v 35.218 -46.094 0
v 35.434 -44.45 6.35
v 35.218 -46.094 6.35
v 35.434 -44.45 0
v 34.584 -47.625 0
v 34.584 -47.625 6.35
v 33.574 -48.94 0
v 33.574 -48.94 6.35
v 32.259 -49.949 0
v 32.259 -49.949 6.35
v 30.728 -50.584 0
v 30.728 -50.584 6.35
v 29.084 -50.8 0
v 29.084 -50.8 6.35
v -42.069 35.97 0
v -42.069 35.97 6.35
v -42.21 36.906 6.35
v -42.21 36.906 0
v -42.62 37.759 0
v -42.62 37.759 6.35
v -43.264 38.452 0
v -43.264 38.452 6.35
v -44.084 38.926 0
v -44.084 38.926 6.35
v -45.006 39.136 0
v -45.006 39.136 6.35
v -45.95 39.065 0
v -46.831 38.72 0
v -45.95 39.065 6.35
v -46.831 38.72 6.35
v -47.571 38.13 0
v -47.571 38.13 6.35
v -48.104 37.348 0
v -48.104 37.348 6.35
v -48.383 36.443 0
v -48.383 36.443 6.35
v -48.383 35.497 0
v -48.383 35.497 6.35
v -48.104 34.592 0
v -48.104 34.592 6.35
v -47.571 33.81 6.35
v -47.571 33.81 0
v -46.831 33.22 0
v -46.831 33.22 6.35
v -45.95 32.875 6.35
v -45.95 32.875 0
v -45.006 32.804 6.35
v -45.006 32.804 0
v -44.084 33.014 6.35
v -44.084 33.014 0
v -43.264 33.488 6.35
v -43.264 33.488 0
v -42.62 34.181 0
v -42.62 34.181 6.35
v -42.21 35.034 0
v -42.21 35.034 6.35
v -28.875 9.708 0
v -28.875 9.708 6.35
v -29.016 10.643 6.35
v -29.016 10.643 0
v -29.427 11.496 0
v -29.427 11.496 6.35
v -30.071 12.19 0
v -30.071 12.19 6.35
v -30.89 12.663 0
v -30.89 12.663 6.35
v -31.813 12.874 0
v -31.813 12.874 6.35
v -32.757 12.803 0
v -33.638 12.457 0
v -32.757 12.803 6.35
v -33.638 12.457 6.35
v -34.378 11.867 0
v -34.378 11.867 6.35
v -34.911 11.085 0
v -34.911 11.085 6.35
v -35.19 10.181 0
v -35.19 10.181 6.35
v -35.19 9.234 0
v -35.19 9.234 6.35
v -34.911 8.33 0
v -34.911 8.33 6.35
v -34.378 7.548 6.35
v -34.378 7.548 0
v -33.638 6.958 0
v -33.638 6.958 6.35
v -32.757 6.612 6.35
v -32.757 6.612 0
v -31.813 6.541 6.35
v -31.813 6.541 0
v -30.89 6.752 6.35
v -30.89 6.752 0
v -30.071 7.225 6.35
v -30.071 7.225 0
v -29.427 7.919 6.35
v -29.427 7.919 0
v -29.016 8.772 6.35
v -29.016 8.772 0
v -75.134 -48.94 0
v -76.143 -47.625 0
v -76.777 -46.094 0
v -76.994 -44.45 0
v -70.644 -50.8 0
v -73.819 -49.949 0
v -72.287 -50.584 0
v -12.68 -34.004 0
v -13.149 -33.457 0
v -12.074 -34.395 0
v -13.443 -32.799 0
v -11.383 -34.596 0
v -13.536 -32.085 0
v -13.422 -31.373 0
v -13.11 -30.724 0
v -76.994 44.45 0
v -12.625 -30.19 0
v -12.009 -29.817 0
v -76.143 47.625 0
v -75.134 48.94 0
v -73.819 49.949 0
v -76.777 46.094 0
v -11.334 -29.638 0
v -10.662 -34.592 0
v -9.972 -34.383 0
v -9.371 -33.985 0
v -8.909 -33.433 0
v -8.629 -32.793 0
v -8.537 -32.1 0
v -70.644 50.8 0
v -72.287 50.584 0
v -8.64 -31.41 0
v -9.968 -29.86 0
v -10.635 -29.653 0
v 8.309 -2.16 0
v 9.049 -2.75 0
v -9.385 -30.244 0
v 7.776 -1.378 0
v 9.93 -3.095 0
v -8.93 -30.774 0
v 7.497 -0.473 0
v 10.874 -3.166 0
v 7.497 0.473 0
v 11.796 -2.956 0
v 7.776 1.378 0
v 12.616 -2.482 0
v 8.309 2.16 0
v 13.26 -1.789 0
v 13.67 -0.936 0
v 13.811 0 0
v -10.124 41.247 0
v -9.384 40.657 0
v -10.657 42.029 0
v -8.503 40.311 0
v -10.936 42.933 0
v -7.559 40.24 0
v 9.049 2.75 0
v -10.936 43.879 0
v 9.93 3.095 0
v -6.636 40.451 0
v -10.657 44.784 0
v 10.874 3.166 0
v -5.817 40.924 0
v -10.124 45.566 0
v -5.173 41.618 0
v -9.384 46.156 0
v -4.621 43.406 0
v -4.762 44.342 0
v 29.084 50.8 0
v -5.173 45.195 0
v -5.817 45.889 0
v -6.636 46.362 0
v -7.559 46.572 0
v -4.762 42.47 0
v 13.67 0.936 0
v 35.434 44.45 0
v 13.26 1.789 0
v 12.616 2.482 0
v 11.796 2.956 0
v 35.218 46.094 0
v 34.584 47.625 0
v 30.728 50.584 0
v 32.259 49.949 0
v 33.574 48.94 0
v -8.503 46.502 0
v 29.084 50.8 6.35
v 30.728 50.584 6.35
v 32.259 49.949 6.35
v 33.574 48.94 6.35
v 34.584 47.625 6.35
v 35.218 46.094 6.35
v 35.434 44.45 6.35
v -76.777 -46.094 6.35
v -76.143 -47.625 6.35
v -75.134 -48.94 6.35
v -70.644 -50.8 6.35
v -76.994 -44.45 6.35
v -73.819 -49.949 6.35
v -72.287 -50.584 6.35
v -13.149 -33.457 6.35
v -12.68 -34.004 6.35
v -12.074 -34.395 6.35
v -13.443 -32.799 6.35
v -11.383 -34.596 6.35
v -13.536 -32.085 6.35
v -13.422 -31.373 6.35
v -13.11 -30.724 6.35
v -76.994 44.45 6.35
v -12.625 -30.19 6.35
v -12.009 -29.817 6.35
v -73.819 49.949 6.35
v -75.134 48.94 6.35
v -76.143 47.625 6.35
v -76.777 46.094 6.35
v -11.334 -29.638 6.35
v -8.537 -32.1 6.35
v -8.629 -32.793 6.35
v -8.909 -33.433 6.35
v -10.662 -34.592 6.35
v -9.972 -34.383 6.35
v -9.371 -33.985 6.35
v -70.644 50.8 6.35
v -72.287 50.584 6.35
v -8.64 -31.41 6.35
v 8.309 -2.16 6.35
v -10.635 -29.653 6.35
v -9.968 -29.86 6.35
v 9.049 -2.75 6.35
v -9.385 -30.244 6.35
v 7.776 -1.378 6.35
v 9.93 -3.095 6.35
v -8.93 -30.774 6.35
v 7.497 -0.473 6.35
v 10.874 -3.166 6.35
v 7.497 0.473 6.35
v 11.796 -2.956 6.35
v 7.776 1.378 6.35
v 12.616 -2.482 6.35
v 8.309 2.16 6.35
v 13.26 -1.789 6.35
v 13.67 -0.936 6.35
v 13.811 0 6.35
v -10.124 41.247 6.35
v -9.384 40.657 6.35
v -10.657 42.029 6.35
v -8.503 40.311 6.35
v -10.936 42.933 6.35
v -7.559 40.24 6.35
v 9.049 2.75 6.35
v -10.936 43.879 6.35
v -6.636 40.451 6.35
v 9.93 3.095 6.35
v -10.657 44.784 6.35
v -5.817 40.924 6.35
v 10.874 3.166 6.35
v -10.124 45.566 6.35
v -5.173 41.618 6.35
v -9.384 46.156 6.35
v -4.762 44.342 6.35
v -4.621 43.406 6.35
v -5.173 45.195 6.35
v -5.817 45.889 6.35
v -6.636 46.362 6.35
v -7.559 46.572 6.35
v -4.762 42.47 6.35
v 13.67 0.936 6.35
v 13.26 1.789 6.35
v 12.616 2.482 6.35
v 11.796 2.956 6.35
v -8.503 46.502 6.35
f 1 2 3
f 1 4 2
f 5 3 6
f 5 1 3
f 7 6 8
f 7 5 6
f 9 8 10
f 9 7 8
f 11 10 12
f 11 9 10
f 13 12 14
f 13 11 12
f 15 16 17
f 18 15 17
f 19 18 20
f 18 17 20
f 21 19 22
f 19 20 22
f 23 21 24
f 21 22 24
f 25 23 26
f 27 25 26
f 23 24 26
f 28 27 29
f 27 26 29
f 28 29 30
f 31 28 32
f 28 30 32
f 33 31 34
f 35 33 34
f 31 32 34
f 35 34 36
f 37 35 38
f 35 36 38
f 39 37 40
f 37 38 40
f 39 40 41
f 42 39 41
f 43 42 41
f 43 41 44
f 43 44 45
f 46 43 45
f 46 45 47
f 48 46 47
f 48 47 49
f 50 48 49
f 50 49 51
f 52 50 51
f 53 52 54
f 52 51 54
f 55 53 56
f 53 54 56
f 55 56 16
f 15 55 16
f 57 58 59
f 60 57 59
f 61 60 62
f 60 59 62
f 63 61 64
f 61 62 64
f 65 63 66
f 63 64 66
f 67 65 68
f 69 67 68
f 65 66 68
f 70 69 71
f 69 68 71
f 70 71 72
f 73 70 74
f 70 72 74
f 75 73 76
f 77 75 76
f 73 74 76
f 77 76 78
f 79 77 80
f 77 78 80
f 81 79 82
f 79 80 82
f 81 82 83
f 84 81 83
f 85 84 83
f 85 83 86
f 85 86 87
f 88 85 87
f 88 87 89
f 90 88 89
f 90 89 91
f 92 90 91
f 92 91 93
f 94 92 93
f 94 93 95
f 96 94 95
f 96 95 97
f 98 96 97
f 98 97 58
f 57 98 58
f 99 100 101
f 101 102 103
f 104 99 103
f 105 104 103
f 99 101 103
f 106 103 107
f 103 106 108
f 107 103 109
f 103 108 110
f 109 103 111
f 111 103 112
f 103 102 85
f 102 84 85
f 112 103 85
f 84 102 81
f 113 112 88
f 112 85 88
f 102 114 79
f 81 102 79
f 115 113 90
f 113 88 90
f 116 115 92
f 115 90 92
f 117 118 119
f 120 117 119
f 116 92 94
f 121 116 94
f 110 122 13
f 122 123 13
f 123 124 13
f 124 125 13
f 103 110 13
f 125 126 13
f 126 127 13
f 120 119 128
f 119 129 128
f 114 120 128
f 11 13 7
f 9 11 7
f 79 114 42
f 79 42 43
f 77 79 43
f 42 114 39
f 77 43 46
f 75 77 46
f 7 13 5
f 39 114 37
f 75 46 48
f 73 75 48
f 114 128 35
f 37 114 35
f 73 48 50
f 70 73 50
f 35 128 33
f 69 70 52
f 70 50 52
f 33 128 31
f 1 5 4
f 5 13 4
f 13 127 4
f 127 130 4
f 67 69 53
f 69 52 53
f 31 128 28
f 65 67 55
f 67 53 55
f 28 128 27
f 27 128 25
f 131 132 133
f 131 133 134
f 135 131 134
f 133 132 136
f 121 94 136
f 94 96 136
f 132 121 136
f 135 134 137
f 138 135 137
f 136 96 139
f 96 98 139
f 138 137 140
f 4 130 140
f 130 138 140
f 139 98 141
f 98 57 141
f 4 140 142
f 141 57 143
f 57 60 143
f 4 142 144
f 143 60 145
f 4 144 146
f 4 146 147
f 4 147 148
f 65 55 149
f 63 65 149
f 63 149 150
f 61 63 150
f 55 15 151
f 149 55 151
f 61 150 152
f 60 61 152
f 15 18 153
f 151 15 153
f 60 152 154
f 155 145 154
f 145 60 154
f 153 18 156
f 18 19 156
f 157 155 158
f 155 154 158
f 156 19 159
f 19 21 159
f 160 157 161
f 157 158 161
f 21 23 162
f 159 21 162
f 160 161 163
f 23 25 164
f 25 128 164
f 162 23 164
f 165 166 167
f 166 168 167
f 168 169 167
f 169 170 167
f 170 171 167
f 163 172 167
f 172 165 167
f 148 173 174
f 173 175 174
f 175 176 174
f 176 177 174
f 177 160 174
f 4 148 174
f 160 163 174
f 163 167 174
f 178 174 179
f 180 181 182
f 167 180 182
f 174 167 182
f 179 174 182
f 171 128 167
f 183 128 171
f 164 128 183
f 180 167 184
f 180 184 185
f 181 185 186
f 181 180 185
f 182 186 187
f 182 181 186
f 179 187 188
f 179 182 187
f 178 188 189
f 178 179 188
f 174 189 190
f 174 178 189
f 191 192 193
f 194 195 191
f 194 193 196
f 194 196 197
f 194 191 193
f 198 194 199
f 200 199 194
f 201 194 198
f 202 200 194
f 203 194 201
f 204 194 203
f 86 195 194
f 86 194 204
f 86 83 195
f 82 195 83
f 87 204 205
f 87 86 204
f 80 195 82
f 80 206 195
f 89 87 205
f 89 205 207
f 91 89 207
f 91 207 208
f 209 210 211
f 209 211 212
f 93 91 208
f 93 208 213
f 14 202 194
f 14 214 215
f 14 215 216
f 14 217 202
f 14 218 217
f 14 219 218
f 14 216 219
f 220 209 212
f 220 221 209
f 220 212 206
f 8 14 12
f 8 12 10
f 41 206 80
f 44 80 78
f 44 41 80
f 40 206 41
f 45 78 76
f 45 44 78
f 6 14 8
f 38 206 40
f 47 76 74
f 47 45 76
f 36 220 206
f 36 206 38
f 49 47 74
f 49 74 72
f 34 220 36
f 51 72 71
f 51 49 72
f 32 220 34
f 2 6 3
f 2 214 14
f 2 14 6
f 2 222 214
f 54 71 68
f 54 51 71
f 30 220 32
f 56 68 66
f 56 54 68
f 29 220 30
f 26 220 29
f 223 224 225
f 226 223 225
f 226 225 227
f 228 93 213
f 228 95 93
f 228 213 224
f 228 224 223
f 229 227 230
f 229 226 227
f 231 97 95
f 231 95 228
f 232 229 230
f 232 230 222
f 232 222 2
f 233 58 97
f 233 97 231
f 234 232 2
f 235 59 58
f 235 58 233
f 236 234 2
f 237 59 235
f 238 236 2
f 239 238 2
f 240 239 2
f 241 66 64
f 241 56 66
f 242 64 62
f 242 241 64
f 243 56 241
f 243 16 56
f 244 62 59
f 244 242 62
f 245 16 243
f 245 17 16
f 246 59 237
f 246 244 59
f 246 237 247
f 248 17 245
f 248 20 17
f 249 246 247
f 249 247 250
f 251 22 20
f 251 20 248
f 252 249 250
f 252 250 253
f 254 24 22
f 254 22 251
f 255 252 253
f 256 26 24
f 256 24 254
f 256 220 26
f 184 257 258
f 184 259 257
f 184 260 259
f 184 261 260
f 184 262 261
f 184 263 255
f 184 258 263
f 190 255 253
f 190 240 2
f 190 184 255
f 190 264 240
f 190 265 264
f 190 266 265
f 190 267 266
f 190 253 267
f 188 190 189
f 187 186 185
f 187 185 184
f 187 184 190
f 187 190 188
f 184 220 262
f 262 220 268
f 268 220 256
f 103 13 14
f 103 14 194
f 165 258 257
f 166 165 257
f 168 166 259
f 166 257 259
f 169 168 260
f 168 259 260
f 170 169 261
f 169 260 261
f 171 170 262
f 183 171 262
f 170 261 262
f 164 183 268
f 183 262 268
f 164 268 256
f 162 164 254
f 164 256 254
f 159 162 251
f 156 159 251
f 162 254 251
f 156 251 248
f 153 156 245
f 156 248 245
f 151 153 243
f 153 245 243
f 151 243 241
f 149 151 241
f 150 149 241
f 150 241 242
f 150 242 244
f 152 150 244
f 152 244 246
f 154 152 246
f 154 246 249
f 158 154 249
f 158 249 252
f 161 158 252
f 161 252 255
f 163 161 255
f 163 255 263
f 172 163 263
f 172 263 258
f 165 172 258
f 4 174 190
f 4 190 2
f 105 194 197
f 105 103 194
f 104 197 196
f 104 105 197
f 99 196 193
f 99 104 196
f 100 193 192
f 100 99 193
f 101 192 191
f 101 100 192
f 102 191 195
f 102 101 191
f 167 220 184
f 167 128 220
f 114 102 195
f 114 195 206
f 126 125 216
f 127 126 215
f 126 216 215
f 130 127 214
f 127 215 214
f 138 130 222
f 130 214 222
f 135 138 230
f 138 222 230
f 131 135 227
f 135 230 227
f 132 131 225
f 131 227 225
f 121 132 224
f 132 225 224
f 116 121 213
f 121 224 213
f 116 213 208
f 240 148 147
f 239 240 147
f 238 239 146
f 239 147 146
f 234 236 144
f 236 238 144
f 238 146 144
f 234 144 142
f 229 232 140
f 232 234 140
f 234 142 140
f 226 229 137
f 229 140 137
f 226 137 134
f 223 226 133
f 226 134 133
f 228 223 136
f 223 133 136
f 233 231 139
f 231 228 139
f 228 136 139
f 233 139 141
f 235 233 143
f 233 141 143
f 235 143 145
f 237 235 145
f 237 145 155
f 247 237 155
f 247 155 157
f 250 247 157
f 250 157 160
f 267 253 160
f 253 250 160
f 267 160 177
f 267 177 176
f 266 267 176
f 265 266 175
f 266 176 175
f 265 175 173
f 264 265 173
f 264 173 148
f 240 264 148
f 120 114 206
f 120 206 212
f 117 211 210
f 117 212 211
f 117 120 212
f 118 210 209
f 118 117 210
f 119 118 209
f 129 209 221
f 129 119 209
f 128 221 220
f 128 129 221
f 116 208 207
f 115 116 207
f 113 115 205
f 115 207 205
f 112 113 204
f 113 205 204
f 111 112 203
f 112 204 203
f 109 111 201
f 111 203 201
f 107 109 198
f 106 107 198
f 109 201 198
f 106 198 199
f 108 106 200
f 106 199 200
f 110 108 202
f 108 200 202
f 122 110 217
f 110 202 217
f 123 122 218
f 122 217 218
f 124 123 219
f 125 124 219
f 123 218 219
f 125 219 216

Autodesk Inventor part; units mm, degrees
ref_plane "YZ Plane" through (0, 0, 0) normal (1, 0, 0) x (0, 1, 0)
ref_plane "XZ Plane" through (0, 0, 0) normal (0, 1, 0) x (-1, 0, 0)
ref_plane "XY Plane" through (0, 0, 0) normal (0, 0, 1) x (1, 0, 0)
sketch "Sketch1" plane through (0, 0, 0) normal (0, 0, 1) x (1, 0, 0)
  circle A0 centre (-45.2437, 35.97) radius 1.27 projected
  circle A1 centre (-45.2437, 35.97) radius 1.27 projected
  circle A2 centre (10.6363, 0) radius 3.175 projected
  line L0 (-76.9938, -50.8) -> (-76.9938, 50.8) projected
  line L1 (76.9938, -50.8) -> (-76.9938, -50.8) projected
  line L2 (76.9938, 50.8) -> (76.9938, -50.8) projected
  line L3 (-76.9938, 50.8) -> (76.9938, 50.8) projected
  line L4 (-70.6437, 50.8) -> (29.0843, 50.8)
  line L5 (35.4343, 44.45) -> (35.4343, -44.45)
  line L6 (29.0843, -50.8) -> (-70.6437, -50.8)
  line L7 (-76.9937, -44.45) -> (-76.9938, 44.45)
  arc A3 (-70.6437, 50.8) -> (-76.9938, 44.45) centre (-70.6437, 44.45) ccw
  arc A4 (29.0843, -50.8) -> (35.4343, -44.45) centre (29.0843, -44.45) ccw
  arc A5 (35.4343, 44.45) -> (29.0843, 50.8) centre (29.0843, 44.45) ccw
  arc A6 (-76.9937, -44.45) -> (-70.6437, -50.8) centre (-70.6437, -44.45) ccw
  circle A7 centre (-7.7961, 43.4062) radius 3.175 projected
  circle A8 centre (-32.0501, 9.7076) radius 3.175 projected
  point P0 (0, 0)
  point P1 (35.4343, -50.8)
  dimension "d0" = 6.35
extrude "Extrusion1" add sketch "Sketch1" along normal blind 6.35 contours L0 A3 L3 A5 L5 A4 L1 A6 | A7 | A8
sketch "Sketch2" plane through (0, 0, 6.35) normal (0, 0, 1) x (1, 0, 0)
  circle A0 centre (-45.2437, 35.97) radius 1.27 projected
  circle A1 centre (-7.7961, 43.4062) radius 3.175 projected
  circle A2 centre (-32.0501, 9.7076) radius 3.175 projected
  circle A3 centre (-45.2437, 35.97) radius 3.175 projected
  point P0 (0, 0)
extrude "Extrusion2" cut sketch "Sketch2" against normal through all
sketch "Sketch3" plane through (0, 0, 6.35) normal (0, 0, 1) x (1, 0, 0)
  arc A0 (-12.0087, -29.8172) -> (-8.9086, -33.4326) centre (-11.0366, -32.1205) ccw projected
  circle A1 centre (-11.0366, -32.1205) radius 2.5
  point P0 (0, 0)
extrude "Extrusion3" cut sketch "Sketch3" against normal through all
properties part number "projectorMountingPlate"
